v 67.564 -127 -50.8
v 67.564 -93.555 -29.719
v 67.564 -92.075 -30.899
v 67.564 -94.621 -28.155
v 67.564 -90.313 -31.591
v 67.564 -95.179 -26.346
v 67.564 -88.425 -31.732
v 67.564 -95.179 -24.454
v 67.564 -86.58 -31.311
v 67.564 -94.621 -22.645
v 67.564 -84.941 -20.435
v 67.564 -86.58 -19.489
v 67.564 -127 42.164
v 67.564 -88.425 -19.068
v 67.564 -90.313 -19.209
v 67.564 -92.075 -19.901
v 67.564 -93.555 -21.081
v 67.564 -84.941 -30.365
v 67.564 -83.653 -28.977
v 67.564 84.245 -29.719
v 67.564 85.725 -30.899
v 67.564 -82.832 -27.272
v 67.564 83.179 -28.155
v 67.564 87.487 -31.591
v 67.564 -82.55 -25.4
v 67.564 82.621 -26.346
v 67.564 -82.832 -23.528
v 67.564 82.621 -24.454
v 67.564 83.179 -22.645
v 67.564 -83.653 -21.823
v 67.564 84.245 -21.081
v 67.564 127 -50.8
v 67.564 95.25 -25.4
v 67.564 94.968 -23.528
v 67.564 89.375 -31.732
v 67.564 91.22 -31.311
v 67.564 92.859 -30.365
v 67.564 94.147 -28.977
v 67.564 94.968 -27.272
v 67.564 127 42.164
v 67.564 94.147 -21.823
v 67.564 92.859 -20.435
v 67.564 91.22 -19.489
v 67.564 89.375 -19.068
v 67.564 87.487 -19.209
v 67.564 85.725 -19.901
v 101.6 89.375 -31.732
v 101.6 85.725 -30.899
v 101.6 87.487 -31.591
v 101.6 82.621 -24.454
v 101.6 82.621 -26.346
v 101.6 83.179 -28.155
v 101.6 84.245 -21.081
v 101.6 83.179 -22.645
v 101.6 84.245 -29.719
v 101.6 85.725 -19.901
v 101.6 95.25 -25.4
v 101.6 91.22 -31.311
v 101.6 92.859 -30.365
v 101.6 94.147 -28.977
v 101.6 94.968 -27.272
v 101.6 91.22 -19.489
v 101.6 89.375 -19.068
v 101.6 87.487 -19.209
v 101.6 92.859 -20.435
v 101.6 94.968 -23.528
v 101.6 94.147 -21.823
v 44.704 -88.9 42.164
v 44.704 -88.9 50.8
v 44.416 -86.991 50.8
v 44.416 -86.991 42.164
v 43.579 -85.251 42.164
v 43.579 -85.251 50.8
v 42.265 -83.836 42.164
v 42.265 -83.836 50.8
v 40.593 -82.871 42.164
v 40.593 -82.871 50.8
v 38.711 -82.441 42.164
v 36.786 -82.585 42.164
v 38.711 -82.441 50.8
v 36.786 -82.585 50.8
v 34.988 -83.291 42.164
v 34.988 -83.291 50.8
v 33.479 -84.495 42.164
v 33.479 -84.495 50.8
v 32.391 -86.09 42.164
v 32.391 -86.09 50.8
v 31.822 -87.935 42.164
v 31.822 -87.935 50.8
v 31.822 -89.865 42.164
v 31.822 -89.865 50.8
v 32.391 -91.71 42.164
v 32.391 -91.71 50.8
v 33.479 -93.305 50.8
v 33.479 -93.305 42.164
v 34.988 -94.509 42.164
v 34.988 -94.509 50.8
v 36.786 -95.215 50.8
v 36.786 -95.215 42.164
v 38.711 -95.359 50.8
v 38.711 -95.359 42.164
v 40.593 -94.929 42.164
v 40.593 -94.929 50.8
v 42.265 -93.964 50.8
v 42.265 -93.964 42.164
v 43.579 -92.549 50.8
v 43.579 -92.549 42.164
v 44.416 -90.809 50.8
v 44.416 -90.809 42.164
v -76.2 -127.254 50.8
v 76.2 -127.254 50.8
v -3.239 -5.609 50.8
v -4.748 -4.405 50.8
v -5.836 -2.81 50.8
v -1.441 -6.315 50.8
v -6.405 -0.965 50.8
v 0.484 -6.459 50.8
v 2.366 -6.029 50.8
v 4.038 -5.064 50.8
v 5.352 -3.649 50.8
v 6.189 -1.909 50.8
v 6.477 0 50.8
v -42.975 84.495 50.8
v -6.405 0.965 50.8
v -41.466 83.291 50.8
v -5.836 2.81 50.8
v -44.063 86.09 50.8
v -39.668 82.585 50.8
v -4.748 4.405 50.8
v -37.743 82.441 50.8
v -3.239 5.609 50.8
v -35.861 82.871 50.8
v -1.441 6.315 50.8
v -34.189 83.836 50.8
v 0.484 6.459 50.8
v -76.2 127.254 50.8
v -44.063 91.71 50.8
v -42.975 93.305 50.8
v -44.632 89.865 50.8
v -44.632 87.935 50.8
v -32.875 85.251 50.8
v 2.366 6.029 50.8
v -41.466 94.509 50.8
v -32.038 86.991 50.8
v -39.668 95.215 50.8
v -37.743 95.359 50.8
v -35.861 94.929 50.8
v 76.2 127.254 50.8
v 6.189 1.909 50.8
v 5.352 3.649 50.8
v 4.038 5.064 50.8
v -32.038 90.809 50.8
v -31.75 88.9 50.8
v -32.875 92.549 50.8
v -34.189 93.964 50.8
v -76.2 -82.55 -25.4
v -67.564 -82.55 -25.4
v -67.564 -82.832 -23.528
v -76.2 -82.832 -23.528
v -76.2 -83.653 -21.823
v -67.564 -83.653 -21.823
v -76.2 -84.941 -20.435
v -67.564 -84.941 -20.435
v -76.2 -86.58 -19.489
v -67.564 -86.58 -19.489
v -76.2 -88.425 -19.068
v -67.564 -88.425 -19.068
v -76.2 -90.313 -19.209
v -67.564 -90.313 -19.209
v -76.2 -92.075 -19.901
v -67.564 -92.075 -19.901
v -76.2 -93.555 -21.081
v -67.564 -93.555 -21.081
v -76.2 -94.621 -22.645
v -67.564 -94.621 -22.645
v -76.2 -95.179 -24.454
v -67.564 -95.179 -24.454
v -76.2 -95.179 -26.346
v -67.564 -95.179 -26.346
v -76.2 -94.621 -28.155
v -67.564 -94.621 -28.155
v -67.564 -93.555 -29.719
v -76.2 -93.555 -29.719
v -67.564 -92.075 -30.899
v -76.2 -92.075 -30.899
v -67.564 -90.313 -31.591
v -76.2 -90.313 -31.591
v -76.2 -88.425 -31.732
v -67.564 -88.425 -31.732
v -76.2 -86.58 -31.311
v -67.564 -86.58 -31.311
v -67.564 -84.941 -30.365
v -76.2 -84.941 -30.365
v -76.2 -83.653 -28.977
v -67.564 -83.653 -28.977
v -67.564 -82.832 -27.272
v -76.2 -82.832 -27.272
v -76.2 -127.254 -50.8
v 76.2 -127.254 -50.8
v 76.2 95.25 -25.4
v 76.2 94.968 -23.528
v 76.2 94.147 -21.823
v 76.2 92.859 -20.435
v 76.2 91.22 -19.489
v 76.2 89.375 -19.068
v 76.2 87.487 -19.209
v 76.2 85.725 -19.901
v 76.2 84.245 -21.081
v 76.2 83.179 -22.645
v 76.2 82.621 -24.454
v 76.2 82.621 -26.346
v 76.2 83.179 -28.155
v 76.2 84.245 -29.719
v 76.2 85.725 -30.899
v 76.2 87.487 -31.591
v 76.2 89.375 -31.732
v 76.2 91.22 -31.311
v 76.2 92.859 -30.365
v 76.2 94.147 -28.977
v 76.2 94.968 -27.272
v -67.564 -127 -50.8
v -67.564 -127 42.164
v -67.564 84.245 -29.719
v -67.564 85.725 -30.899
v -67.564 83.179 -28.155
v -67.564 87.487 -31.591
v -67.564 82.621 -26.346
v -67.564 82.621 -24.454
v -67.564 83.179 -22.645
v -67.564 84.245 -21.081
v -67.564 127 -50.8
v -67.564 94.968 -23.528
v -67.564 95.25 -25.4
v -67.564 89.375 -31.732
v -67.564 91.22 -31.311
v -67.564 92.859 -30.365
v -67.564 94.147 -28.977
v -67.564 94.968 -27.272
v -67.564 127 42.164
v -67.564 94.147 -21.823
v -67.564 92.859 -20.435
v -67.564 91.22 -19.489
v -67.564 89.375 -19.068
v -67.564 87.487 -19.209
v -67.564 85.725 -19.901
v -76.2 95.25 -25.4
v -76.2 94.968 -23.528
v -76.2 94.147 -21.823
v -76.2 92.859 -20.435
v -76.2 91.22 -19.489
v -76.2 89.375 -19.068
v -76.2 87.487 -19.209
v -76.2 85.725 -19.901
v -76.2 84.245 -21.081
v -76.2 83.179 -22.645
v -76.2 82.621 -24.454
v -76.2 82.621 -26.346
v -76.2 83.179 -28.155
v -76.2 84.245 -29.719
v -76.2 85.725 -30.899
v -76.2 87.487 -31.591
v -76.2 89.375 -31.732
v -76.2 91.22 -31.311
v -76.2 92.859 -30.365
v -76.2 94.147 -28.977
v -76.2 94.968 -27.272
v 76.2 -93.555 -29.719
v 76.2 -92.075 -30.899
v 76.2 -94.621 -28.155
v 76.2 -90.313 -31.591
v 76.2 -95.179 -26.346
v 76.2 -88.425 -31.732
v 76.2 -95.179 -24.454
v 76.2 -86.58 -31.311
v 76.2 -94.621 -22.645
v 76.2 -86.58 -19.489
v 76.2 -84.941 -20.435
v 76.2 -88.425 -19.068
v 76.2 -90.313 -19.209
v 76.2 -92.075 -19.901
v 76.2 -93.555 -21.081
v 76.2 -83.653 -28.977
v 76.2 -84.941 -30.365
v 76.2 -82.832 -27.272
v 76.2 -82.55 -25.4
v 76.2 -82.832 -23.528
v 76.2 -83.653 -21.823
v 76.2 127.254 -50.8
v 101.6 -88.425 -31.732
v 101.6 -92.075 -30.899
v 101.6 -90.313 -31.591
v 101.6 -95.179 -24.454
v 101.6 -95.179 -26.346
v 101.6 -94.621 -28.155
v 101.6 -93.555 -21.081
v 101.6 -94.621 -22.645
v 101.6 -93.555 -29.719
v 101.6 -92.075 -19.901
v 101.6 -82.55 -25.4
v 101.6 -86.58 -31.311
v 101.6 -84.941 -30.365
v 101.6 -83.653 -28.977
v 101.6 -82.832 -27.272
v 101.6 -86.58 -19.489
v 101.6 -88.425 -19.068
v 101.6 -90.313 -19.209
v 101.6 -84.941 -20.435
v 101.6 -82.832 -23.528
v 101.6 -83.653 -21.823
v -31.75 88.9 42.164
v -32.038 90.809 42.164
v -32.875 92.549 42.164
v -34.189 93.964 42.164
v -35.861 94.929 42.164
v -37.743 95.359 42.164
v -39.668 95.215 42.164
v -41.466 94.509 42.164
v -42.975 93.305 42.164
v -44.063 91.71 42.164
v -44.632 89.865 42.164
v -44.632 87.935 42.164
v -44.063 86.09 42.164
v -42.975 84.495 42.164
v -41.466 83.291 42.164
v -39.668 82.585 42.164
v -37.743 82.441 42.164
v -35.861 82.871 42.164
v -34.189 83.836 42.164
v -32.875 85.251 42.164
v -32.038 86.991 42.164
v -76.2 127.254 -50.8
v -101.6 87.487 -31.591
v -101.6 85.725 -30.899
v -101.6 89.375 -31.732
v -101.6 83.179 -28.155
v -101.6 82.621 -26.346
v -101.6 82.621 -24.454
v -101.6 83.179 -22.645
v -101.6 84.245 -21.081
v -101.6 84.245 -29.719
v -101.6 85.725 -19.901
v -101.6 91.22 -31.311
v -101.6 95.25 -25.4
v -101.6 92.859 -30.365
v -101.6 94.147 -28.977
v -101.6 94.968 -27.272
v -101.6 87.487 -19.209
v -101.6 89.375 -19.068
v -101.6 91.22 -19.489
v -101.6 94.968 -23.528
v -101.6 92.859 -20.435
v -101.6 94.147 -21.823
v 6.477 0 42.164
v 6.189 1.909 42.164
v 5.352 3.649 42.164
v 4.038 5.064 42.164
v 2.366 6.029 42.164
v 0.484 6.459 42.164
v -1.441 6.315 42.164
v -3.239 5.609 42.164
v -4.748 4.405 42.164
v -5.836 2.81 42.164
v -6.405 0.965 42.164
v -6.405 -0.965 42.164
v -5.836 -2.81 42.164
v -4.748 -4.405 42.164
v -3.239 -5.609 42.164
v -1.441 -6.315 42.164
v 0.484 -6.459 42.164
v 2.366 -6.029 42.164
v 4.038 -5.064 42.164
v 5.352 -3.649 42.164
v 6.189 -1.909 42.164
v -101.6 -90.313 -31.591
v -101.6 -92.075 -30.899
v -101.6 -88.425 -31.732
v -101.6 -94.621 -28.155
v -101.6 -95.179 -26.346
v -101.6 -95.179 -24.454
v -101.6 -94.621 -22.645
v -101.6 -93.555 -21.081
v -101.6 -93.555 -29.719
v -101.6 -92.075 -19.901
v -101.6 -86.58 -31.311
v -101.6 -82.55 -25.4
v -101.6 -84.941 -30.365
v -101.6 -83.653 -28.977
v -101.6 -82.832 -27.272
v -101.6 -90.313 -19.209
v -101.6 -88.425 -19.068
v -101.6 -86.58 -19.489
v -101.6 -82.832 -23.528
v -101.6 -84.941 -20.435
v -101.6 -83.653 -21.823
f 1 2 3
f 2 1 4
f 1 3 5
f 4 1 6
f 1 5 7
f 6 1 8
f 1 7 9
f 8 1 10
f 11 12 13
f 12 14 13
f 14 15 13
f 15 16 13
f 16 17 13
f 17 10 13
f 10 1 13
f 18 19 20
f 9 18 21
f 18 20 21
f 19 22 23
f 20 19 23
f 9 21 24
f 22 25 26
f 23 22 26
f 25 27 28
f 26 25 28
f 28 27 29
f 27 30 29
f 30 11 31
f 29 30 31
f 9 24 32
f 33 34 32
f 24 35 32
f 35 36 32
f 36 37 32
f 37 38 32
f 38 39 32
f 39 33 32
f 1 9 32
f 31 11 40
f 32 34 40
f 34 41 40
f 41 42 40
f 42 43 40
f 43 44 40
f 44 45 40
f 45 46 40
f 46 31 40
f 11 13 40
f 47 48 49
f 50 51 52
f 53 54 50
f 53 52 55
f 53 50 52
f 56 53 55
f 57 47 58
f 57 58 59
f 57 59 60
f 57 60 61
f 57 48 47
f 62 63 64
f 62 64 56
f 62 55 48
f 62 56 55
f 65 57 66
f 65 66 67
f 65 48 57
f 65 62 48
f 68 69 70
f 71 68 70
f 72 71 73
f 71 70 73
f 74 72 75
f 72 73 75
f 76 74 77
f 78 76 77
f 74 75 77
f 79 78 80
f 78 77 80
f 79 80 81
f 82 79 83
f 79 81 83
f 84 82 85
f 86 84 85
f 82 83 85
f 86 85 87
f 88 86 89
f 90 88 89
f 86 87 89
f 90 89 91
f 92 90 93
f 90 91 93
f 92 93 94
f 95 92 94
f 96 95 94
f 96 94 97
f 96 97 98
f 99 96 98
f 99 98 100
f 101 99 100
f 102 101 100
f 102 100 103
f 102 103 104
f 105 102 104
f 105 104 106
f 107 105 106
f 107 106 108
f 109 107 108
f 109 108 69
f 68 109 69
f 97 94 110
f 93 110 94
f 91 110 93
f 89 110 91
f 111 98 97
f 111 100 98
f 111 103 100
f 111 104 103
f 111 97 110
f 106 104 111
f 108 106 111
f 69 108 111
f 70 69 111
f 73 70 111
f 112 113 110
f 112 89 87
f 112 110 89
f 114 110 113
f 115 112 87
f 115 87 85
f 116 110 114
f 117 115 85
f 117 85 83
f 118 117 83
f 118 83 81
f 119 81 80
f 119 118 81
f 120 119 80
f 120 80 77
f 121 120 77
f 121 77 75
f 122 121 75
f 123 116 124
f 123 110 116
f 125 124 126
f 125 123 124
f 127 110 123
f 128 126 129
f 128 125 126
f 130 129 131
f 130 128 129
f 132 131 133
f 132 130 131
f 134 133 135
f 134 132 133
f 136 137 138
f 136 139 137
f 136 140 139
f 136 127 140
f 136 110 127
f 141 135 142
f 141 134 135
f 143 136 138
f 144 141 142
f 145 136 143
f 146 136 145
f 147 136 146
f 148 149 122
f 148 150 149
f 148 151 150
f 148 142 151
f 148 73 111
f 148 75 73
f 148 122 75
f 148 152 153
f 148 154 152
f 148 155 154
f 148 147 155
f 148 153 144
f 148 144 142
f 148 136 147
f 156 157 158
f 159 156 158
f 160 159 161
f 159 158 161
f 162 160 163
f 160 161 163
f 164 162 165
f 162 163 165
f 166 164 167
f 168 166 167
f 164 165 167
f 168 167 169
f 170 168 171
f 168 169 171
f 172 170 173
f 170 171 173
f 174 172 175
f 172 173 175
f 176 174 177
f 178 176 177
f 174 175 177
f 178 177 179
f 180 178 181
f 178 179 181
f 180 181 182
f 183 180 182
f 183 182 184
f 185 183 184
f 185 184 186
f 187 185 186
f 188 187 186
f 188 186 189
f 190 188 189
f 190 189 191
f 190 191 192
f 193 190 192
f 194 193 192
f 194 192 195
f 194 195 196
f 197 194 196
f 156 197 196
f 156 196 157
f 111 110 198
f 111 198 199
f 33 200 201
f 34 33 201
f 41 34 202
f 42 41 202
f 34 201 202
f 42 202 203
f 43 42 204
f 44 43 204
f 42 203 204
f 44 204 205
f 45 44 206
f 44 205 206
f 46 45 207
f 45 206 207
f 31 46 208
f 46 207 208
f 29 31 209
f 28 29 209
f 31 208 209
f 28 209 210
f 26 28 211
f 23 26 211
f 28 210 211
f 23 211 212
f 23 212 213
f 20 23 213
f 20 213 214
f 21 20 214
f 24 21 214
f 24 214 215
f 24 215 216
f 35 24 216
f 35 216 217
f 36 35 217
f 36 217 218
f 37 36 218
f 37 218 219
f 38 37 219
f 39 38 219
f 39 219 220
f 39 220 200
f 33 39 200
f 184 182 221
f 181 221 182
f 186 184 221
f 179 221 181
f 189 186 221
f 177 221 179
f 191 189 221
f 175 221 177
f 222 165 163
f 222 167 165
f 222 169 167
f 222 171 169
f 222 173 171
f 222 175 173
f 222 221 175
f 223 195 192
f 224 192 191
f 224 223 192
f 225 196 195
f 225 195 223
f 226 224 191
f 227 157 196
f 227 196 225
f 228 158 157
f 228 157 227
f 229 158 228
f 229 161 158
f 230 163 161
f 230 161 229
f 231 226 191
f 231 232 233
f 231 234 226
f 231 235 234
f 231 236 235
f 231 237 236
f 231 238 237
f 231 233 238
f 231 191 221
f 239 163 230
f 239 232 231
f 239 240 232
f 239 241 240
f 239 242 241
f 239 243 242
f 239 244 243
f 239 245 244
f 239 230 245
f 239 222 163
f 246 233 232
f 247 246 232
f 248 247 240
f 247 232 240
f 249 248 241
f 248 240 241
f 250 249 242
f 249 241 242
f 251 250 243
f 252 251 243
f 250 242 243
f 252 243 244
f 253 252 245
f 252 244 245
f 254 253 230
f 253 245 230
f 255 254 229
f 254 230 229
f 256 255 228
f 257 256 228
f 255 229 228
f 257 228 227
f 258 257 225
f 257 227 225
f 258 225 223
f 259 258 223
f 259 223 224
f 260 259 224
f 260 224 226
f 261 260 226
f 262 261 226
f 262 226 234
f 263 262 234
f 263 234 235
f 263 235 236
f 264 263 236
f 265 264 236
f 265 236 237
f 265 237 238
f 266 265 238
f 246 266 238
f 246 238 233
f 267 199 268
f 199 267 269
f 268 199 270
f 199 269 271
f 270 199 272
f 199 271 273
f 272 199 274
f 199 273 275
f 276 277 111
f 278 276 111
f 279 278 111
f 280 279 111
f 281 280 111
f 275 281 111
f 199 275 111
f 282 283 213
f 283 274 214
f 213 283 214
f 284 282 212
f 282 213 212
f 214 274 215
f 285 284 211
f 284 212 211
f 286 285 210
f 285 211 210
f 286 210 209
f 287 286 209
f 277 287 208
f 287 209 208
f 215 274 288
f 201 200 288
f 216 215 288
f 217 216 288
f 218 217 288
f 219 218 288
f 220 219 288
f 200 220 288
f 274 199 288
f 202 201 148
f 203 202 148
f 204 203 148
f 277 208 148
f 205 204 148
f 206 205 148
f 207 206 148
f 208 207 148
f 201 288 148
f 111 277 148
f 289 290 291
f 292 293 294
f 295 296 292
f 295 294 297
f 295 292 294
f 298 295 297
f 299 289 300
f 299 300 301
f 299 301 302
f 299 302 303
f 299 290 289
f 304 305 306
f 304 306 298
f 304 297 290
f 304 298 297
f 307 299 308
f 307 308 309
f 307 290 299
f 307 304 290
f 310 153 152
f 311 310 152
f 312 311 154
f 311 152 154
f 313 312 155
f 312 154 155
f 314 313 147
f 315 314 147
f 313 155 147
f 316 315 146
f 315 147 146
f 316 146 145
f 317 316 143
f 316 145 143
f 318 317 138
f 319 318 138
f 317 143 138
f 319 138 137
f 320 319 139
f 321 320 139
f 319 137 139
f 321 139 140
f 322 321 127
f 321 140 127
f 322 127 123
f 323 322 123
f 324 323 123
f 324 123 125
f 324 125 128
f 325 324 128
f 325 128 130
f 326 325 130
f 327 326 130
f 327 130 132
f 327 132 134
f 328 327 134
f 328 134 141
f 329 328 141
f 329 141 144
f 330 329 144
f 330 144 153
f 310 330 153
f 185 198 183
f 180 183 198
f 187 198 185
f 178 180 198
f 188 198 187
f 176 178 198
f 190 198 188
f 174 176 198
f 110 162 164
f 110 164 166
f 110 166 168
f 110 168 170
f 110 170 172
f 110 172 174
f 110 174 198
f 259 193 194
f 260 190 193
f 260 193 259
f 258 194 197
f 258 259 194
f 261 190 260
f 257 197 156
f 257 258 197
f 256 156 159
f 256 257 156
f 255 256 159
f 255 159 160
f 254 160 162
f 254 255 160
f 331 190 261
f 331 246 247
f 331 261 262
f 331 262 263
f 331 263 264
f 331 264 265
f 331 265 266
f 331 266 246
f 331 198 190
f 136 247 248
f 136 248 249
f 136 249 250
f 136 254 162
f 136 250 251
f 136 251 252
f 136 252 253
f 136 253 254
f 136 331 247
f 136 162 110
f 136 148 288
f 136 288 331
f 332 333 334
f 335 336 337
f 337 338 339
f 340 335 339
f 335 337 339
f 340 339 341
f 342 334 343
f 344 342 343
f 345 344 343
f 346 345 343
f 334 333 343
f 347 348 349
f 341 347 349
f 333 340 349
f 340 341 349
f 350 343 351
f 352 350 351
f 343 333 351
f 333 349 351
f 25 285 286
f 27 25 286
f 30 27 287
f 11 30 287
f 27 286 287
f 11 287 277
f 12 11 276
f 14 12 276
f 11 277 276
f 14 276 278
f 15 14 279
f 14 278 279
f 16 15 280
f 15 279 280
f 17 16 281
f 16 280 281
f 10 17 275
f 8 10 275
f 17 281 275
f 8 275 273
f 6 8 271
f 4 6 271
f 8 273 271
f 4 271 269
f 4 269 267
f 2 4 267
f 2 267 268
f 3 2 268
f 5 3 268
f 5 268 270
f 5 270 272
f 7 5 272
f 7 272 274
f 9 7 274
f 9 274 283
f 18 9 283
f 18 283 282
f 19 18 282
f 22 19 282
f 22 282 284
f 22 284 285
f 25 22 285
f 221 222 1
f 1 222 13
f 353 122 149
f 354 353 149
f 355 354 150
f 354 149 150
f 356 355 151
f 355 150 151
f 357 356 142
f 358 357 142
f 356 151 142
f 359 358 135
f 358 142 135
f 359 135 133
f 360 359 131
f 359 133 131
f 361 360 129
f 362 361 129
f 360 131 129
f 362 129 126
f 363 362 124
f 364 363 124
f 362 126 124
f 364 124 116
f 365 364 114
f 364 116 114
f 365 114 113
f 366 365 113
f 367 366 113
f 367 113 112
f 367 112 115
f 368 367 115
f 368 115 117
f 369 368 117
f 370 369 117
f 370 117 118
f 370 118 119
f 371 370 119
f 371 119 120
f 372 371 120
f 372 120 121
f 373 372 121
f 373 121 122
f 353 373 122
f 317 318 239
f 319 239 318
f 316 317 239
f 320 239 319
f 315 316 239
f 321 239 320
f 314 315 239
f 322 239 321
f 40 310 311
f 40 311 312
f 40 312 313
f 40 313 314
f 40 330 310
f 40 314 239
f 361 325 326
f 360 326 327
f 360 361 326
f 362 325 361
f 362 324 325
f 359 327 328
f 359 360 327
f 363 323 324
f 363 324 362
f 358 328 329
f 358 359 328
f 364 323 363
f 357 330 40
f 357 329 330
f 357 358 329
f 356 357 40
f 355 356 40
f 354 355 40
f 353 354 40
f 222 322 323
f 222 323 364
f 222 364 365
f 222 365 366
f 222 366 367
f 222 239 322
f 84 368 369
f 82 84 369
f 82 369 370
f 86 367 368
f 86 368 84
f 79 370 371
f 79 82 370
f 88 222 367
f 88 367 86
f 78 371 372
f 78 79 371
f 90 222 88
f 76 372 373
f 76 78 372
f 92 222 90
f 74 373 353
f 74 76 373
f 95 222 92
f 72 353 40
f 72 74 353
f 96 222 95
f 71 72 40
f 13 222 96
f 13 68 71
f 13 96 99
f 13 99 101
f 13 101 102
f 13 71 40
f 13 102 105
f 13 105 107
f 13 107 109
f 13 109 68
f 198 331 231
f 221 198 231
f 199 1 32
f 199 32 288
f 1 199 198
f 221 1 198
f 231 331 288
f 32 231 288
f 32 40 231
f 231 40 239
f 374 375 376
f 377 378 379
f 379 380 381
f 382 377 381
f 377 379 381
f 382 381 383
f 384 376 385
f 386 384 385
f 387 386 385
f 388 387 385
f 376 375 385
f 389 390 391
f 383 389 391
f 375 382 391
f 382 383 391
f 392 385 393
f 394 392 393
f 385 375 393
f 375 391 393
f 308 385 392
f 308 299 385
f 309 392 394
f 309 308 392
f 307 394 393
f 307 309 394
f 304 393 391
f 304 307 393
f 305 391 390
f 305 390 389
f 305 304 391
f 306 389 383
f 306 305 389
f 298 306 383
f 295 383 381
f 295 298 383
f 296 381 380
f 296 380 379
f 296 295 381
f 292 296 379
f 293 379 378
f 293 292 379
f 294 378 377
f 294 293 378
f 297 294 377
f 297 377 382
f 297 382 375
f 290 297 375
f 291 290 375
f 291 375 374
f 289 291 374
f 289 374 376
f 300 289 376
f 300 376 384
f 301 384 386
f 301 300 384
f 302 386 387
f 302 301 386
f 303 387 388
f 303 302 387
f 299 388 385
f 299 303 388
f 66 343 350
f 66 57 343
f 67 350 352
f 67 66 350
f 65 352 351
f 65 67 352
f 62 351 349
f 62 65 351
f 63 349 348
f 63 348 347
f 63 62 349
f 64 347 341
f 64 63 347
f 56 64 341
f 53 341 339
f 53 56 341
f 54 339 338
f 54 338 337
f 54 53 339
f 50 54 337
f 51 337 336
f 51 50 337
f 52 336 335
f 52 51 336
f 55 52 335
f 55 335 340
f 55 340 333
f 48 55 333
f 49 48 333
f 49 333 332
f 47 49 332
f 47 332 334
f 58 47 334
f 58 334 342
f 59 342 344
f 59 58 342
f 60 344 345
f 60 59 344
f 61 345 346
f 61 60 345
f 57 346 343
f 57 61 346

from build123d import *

# Parameters (mm, degrees)
F0_W      = 152.4
F0_H      = 101.6
F0_W_2    = 135.128
F0_H_2    = 84.328
F1_DEPTH  = 127
F2_R      = 6.35
F3_DEPTH  = 152.401
F4_R      = 6.35
F5_DEPTH  = 101.6
F6_W      = 135.128
F6_H      = 254
F7_DEPTH  = 25.4
F8_R      = 6.477
F9_DEPTH  = 25.4
F10_W     = 152.4
F10_H     = 101.6
F11_DEPTH = 0.254
F12_W     = 152.4
F12_H     = 101.6
F13_DEPTH = 0.254


with BuildPart() as f1:
    # F0 (on Front) → F1 (new body, symmetric)
    with BuildSketch(Plane.XZ):
        Rectangle(F0_W, F0_H)
        Rectangle(F0_W_2, F0_H_2, mode=Mode.SUBTRACT)
    extrude(amount=F1_DEPTH, both=True)

    # F2 (on face) → F3 (cut, through all)
    with BuildSketch(Plane.YZ.offset(76.2)):
        with Locations((-88.9, -25.4)):
            Circle(F2_R)
        with Locations((88.9, -25.4)):
            Circle(F2_R)
    extrude(amount=-F3_DEPTH, mode=Mode.SUBTRACT)

    # F6 (on face) → F7 (cut)
    with BuildSketch(Plane.XY.offset(-42.164)):
        Rectangle(F6_W, F6_H)
    extrude(amount=-F7_DEPTH, mode=Mode.SUBTRACT)

    # F8 (on face) → F9 (cut)
    with BuildSketch(Plane.XY.offset(50.8)):
        with Locations((-38.227, 88.9)):
            Circle(F8_R)
        with Locations((38.227, -88.9)):
            Circle(F8_R)
        Circle(F8_R)
    extrude(amount=-F9_DEPTH, mode=Mode.SUBTRACT)

    # F10 (on face) → F11 (join)
    with BuildSketch(Plane(origin=(0, 127, 0), x_dir=(-1, 0, 0), z_dir=(0, 1, 0))):
        Rectangle(F10_W, F10_H)
    extrude(amount=F11_DEPTH)

    # F12 (on face) → F13 (join)
    with BuildSketch(Plane.XZ.offset(127)):
        Rectangle(F12_W, F12_H)
    extrude(amount=F13_DEPTH)


with BuildPart() as f5:
    # F4 (on Right) → F5 (new body, symmetric)
    with BuildSketch(Plane.YZ):
        with Locations((-88.9, -25.4)):
            Circle(F4_R)
    extrude(amount=F5_DEPTH, both=True)


with BuildPart() as f5b:
    # F4 (on Right) → F5, piece 2 (new body, symmetric)
    with BuildSketch(Plane.YZ):
        with Locations((88.9, -25.4)):
            Circle(F4_R)
    extrude(amount=F5_DEPTH, both=True)


solid = Compound([f1.part, f5.part, f5b.part])
